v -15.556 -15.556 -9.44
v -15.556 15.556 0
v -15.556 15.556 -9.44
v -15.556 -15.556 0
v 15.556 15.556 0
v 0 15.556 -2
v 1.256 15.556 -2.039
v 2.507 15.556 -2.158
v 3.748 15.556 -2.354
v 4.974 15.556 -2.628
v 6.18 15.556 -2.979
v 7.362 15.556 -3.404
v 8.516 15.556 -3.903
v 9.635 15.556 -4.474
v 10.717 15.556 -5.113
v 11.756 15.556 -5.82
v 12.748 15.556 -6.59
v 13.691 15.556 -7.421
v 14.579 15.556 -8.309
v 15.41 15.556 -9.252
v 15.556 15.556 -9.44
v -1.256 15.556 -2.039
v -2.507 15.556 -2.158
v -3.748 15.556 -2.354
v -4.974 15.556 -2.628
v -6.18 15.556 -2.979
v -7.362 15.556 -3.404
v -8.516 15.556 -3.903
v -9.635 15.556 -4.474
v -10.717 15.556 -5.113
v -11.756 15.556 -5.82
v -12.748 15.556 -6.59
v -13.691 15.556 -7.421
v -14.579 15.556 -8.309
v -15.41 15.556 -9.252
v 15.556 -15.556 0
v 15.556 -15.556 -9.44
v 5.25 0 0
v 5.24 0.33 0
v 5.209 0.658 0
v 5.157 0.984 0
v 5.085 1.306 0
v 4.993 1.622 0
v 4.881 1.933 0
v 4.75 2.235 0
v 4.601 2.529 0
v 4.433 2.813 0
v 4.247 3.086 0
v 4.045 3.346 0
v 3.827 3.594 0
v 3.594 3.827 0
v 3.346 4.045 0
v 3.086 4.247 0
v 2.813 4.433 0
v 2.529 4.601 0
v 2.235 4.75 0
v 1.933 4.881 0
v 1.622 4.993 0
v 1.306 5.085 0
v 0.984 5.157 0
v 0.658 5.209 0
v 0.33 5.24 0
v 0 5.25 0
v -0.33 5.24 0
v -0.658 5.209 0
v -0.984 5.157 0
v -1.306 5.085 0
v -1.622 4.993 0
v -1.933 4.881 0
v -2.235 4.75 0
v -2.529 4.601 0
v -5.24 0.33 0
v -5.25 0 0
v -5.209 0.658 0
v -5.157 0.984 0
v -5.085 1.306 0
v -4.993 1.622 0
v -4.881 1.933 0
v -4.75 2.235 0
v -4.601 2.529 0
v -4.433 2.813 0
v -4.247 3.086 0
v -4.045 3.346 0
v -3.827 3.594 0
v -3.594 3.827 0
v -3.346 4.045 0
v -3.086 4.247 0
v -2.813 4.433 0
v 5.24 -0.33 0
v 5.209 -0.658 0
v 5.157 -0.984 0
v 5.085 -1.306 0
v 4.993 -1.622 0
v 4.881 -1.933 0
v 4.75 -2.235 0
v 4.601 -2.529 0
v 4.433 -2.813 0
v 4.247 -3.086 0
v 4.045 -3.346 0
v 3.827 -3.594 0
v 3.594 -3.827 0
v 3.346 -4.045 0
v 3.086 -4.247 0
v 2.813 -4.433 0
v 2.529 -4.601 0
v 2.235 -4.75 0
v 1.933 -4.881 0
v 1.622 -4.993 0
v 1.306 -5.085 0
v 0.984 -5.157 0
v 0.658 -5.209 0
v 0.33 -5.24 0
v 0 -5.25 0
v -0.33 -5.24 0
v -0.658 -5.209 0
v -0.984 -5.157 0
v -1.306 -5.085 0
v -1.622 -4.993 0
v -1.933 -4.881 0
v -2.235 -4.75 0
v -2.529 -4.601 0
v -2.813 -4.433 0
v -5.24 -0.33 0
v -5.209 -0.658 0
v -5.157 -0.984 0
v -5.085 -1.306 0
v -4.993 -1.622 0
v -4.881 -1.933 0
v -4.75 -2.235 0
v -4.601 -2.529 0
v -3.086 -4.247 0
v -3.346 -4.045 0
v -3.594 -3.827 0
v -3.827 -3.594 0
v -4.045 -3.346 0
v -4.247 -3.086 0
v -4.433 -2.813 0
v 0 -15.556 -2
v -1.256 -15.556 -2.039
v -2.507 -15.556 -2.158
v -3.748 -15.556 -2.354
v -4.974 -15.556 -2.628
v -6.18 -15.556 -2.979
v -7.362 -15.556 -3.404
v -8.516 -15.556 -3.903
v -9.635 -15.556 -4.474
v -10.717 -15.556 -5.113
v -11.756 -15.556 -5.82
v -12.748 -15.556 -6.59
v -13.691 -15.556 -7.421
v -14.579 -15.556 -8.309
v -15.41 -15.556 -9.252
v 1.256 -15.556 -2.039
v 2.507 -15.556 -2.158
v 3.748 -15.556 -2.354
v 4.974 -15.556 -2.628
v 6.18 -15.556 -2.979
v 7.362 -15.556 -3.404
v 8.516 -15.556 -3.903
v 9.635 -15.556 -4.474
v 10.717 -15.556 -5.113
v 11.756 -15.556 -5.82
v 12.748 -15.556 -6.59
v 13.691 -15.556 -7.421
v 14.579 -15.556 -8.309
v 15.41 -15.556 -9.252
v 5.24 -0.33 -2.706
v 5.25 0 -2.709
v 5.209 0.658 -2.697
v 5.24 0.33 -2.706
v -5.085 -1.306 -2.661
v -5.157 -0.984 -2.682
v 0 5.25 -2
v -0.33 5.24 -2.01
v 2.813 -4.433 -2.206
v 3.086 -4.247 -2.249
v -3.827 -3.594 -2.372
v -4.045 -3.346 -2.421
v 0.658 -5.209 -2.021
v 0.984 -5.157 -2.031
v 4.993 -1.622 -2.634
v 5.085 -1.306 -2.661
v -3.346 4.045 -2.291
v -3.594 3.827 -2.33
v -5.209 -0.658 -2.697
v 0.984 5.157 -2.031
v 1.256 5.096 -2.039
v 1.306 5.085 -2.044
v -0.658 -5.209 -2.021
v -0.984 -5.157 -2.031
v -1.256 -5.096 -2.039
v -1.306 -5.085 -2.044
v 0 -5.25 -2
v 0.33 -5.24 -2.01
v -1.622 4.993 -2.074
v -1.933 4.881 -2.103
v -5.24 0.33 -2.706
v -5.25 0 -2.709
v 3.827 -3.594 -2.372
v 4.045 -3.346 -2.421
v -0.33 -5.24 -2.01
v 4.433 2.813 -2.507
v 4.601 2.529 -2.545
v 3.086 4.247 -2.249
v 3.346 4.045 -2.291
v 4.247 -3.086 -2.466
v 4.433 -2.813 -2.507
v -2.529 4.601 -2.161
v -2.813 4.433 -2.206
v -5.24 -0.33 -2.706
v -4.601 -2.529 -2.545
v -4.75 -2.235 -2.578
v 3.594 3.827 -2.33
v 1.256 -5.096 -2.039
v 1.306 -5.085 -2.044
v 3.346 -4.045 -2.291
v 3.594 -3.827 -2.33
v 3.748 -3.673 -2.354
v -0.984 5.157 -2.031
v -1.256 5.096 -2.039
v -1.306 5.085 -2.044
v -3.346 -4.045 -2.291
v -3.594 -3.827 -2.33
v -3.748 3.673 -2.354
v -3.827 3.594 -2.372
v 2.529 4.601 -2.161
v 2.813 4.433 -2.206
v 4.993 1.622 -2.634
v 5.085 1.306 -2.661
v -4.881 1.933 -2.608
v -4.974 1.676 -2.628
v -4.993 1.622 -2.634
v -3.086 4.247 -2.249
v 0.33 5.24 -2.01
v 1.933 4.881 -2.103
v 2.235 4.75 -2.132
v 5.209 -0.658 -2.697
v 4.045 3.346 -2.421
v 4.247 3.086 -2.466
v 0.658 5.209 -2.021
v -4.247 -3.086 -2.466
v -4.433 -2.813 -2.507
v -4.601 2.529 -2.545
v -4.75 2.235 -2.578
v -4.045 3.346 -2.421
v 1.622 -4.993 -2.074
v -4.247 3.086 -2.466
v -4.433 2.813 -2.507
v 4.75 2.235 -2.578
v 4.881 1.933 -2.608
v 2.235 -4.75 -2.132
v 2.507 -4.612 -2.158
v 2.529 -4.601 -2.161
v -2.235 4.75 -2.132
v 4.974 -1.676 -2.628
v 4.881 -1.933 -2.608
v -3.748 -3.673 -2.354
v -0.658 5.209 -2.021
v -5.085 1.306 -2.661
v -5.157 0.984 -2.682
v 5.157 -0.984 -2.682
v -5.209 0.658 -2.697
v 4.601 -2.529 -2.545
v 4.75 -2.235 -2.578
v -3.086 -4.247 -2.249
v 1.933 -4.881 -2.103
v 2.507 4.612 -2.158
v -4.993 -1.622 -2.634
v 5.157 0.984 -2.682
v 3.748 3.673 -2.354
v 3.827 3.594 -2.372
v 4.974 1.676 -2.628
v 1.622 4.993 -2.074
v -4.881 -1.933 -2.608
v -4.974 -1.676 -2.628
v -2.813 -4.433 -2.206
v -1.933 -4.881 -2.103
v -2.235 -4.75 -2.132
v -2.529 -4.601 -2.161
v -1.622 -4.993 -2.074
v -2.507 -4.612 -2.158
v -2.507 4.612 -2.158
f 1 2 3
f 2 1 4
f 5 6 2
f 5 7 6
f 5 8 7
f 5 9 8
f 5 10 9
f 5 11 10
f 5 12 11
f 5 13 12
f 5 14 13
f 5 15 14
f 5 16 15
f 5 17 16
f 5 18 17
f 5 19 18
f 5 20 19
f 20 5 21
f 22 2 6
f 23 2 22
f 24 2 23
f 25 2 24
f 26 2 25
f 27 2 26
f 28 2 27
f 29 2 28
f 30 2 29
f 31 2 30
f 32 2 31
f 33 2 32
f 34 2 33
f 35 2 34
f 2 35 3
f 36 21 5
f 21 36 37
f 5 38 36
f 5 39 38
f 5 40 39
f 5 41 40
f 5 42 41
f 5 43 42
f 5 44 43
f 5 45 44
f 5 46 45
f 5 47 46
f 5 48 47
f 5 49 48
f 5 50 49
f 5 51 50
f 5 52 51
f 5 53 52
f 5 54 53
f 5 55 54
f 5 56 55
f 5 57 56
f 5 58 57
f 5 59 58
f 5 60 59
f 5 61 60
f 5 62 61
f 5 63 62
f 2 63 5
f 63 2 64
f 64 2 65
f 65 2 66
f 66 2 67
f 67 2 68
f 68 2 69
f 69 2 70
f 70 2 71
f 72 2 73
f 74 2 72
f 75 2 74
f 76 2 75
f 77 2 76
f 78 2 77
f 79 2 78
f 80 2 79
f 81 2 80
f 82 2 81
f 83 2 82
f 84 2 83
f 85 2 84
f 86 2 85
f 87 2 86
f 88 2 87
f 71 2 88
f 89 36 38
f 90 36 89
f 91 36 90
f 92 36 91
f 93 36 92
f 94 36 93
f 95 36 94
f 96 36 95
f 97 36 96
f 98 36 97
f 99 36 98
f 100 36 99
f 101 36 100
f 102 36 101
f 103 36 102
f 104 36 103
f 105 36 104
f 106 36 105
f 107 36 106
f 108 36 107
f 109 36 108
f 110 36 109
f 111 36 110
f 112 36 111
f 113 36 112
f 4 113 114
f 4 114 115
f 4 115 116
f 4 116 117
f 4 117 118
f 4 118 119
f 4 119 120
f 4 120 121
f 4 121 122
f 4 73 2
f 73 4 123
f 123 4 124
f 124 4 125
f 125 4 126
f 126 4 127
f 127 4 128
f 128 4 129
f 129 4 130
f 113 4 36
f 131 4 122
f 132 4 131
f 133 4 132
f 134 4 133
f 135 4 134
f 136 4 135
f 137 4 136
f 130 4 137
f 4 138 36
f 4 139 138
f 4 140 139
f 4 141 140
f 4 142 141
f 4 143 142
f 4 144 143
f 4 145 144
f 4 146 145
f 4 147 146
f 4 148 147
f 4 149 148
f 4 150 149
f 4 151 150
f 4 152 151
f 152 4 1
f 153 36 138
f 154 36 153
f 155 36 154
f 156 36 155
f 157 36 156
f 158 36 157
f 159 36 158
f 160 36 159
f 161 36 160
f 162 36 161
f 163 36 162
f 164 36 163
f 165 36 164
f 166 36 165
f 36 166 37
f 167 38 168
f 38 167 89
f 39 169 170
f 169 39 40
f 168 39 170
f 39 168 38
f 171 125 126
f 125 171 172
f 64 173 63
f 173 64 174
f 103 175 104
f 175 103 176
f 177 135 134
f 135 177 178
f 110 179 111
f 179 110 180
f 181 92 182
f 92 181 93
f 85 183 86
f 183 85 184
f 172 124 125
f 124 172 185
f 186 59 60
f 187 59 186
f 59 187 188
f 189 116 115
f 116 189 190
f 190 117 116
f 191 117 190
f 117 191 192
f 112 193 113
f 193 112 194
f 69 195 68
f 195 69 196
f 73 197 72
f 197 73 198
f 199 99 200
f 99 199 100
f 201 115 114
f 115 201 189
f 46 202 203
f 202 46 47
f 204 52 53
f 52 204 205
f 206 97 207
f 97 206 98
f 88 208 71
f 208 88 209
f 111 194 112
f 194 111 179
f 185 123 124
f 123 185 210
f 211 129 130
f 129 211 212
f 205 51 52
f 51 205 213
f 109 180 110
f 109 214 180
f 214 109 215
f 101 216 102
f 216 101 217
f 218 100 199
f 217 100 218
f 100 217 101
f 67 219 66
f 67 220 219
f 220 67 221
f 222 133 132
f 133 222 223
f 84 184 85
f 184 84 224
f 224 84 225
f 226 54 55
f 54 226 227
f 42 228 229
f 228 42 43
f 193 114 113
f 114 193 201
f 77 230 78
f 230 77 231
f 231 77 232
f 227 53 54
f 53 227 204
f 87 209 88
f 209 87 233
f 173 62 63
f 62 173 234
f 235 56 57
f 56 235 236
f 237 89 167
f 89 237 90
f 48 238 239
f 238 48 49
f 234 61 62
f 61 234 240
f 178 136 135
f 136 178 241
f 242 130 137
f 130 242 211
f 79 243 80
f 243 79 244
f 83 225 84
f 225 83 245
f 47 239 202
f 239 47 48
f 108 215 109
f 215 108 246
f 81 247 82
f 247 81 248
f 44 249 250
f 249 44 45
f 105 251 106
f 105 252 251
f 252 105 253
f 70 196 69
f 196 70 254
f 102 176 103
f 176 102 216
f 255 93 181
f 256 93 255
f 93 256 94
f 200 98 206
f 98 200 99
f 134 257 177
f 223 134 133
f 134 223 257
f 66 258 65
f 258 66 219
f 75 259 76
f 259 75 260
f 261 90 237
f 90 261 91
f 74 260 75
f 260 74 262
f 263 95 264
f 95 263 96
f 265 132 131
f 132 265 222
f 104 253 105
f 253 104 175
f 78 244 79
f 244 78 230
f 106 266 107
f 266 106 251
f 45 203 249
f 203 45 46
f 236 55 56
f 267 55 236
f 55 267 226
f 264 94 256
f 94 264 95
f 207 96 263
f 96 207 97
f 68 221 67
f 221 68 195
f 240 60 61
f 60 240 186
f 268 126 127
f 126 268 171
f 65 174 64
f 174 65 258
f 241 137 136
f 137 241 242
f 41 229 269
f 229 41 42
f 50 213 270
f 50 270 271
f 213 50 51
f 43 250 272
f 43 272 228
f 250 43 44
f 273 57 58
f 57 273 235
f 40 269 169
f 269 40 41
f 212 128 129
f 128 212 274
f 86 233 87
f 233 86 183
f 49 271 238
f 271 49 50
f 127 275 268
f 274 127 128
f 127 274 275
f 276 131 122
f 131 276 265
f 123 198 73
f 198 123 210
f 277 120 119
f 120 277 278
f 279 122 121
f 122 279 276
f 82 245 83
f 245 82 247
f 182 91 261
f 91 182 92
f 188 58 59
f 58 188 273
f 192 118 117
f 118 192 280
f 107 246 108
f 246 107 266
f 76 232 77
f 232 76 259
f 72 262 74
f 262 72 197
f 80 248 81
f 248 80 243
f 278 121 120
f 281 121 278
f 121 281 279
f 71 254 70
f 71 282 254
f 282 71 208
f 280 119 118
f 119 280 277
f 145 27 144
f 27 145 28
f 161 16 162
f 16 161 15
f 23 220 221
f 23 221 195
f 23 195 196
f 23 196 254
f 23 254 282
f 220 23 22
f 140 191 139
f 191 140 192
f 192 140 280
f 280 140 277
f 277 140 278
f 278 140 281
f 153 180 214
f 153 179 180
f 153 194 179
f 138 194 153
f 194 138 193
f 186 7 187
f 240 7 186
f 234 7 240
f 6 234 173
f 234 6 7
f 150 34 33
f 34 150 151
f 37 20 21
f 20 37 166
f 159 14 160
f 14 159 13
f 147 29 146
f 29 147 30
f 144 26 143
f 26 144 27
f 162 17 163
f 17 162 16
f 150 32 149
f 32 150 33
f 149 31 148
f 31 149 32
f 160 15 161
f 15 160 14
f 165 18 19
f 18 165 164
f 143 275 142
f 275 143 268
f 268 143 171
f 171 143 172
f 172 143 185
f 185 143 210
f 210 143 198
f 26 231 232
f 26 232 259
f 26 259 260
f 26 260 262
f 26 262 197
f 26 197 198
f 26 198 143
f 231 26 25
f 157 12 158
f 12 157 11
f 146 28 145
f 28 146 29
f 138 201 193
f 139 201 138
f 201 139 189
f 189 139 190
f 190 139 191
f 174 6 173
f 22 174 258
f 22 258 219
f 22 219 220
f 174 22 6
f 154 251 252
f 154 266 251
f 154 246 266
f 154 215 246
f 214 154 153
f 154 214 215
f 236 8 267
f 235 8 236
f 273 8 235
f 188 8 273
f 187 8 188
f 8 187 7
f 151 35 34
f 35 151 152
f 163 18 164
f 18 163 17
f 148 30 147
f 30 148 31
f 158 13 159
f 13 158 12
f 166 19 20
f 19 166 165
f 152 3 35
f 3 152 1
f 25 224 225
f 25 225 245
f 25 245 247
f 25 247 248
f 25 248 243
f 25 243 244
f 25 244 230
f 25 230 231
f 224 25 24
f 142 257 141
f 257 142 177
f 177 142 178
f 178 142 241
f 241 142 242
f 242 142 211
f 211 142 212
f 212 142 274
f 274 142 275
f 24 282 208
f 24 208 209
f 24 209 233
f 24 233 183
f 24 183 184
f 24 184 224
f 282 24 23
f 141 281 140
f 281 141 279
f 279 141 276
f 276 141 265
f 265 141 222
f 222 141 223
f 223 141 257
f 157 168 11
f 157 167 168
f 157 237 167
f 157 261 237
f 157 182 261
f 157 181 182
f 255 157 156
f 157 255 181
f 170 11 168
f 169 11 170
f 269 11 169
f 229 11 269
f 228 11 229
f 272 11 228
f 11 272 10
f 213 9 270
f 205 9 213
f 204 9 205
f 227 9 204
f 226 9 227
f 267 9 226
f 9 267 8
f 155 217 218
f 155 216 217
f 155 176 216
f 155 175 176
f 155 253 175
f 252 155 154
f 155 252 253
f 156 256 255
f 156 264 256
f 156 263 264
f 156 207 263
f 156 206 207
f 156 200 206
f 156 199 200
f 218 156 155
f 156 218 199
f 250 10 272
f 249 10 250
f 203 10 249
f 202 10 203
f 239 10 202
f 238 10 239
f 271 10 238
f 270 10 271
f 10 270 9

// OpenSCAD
// Pipe-Washer.scad
// Version: v0.04
//
// Description:
// A parametric washer designed to fit between a pipe and a flat metal washer.
// One side is flat, and the other is curved to match the pipe's outer surface.
// This version adds a fix to allow for "over-sized" washers (e.g., a square
// washer) where the outer dimension is larger than the pipe diameter.

// --- Main Parameters ---

// The outer diameter of the pipe this washer will sit on.
pipe_od = 40;      // [mm]

// The outer diameter (or width for a square) of the washer.
// Can now be larger than pipe_od.
washer_od = 44;    // [mm]

// The inner diameter for the bolt to pass through (e.g., M10 with clearance).
washer_id = 10.5;  // [mm]

// The thinnest part of the washer, located at its central axis.
min_thickness = 2; // [mm]


// --- Quality Settings ---

// Set the default resolution for curved surfaces.
// This is overridden later for the square washer shape.
$fn = 100;


// --- Calculated Variables ---

// Calculate radii from diameters for easier use in OpenSCAD functions.
pipe_r = pipe_od / 2;
washer_r = washer_od / 2;
washer_ir = washer_id / 2;

// --- Robust Geometry Calculation ---
// FIX: To prevent a math error (sqrt of a negative number), we must ensure
// the radius used for the curve calculation is not greater than the pipe's radius.
// We use the 'min()' function to select the smaller of the two.
// This means if the washer is wider than the pipe, the corners will be flat.
real_curve_r = min(washer_r, pipe_r);

// Calculate the height difference based on the safe radius.
height_difference = pipe_r - sqrt(pow(pipe_r, 2) - pow(real_curve_r, 2));

// The maximum thickness of the washer is at its outermost curved edge.
// The "-1" provides a simple 1mm chamfer on the top edge.
max_thickness = min_thickness + height_difference;


// --- Model Generation ---

// The model is constructed with its flat top surface near the z=0 plane.
difference() {
    // 1. The washer "blank".
    // This is a hollow shape that we will cut the curve into.
    translate([0, 0, -max_thickness]) {
        difference() {
            // Main outer body.
            // Rotated by 45 degrees and using $fn=4 to create a square shape.
            // To make it a round washer again, remove the rotate() and the $fn=4.
            rotate([0, 0, 45]) {
              cylinder(h = max_thickness, r = washer_r, $fn=4);
            }
            // Inner hole for the bolt.
            // Made taller to ensure a clean cut all the way through the blank.
            translate([0, 0, -1]) {
                cylinder(h = max_thickness + 2, r = washer_ir);
            }
        }
    }

    // 2. The "cutter" that forms the curved bottom surface.
    // This is a cylinder with the pipe's radius, rotated on its side.
    // It is positioned to carve the curve into the bottom of the blank.
    translate([0, 0, -min_thickness - pipe_r]) {
        rotate([90, 0, 0]) {
            // The cutter cylinder must be long enough to span the entire washer.
            cylinder(h = washer_od * 1.5, r = pipe_r, center = true);
        }
    }
}
